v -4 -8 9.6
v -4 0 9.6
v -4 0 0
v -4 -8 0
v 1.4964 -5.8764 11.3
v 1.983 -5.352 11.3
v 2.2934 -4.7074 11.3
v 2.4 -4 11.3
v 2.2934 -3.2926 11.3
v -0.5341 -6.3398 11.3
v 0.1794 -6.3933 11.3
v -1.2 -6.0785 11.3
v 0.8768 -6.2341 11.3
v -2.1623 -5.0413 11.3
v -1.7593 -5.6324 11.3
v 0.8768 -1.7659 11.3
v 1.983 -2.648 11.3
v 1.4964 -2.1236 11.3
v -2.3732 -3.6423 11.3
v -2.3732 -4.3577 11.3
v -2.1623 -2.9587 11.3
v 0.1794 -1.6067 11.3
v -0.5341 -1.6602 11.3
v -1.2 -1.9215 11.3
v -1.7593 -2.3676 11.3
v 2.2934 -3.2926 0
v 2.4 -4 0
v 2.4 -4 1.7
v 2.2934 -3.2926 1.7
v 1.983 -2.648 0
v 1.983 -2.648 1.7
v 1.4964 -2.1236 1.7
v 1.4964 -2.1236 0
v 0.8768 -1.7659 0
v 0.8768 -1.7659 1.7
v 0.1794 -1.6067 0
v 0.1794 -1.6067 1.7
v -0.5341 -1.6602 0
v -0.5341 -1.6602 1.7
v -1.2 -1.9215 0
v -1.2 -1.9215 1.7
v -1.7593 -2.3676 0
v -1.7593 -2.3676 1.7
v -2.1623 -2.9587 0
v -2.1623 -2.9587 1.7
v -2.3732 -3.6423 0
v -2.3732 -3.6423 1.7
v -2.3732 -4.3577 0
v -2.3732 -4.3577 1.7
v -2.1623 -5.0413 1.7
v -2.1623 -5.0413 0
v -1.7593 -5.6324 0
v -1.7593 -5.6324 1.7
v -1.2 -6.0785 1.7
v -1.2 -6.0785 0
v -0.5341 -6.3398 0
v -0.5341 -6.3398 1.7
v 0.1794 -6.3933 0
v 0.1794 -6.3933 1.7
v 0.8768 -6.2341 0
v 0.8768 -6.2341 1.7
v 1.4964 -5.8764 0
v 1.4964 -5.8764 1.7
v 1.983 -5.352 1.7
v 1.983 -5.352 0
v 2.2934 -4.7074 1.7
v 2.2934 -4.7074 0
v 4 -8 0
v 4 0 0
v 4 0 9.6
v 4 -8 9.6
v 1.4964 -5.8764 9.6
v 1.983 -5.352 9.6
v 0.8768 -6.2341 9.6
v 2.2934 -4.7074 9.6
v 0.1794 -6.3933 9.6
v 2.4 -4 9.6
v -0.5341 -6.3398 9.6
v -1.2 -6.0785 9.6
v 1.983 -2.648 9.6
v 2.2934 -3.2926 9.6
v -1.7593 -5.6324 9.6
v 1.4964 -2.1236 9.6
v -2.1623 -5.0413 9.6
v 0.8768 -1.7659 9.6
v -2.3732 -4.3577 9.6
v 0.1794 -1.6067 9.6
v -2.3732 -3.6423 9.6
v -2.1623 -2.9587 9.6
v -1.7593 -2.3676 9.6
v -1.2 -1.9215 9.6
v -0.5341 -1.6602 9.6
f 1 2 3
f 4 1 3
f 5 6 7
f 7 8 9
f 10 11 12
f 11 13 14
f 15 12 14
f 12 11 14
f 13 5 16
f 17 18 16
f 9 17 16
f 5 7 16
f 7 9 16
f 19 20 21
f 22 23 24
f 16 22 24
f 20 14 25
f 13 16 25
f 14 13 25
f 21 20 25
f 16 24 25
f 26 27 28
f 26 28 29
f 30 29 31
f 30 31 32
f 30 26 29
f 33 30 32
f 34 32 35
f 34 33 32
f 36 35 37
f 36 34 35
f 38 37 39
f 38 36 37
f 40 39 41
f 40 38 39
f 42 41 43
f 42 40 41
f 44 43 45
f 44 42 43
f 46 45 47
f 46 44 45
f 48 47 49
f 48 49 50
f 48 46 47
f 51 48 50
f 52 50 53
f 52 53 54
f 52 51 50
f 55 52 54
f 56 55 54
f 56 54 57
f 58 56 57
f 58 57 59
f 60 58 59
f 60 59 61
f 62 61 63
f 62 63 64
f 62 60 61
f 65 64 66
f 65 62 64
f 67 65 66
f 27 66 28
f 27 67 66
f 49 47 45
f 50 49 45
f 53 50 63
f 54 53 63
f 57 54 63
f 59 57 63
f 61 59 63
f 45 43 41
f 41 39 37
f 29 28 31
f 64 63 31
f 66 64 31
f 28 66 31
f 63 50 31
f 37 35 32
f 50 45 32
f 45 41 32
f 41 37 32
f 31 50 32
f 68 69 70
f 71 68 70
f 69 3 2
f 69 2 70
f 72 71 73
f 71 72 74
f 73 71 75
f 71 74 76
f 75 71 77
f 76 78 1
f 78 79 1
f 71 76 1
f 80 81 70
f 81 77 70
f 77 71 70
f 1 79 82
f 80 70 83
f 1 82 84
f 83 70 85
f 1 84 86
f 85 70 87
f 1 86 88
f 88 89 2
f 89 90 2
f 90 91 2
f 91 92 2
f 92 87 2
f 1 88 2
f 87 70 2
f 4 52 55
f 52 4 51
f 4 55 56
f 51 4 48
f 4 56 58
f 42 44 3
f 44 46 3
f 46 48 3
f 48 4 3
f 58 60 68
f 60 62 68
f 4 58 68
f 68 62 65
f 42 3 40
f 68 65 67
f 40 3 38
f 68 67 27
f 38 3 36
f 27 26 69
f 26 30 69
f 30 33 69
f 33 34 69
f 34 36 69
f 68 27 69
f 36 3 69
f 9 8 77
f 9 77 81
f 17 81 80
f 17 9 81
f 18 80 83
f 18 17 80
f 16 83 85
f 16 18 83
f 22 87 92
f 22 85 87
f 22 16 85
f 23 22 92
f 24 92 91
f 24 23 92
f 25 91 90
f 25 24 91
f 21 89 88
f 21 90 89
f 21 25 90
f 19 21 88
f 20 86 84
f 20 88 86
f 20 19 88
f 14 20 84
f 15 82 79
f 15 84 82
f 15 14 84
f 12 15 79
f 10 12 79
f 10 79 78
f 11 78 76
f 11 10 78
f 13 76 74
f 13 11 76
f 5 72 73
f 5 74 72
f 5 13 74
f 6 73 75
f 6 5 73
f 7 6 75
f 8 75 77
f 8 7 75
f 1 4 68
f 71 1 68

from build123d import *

# Parameters (mm, degrees)
F1_DEPTH = 8
F3_W     = 8
F3_H     = 8
F3_R     = 2.4
F4_DEPTH = 1.7
F5_R     = 2.4
F6_DEPTH = 1.7


with BuildPart() as f1:
    # F0 (on Front) → F1 (new body)
    with BuildSketch(Plane.XZ):
        Polygon((-2.4, 9.6), (-4, 9.6), (-4, 0), (4, 0), (4, 9.6), (2.4, 9.6), (2.4, 11.3), (-2.4, 11.3), align=None)
    extrude(amount=F1_DEPTH)

    # F3 (on plane+point) → F4 (cut, through all)
    with BuildSketch(Plane.XY.offset(11.3)):
        with Locations((0, -4)):
            Rectangle(F3_W, F3_H)
        with Locations((0, -4)):
            Circle(F3_R, mode=Mode.SUBTRACT)
    extrude(amount=-F4_DEPTH, mode=Mode.SUBTRACT)

    # F5 (on Top) → F6 (cut)
    with BuildSketch(Plane.XY):
        with Locations((0, -4)):
            Circle(F5_R)
    extrude(amount=F6_DEPTH, mode=Mode.SUBTRACT)


solid = f1.part
